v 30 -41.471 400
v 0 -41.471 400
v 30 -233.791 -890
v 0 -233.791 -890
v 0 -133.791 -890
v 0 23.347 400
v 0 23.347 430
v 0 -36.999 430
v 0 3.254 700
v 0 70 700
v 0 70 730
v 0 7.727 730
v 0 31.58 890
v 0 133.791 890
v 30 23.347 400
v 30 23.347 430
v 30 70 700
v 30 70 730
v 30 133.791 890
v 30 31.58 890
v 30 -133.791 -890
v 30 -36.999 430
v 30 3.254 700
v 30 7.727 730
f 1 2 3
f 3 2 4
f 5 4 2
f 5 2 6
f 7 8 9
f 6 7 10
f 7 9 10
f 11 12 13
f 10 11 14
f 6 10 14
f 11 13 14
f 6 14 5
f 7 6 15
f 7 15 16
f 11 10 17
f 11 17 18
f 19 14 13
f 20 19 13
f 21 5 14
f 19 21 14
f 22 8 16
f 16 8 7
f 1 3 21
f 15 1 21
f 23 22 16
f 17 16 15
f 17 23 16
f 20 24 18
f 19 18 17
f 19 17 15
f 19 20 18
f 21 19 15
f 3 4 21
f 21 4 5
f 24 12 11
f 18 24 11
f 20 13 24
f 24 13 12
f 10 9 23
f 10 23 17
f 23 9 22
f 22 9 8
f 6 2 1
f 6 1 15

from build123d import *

# Parameters (mm, degrees)
F1_DEPTH = 30
F2_W     = 70
F2_H     = 30
F3_DEPTH = 30
F4_W     = 95.079931
F4_H     = 30
F5_DEPTH = 30


with BuildPart() as f1:
    # F0 (on Right) → F1 (new body)
    with BuildSketch(Plane.YZ):
        Polygon((133.790882, 890), (31.580462, 890), (-233.790882, -890), (-133.790882, -890), align=None)
    extrude(amount=F1_DEPTH)

    # F2 (on Right) → F3 (cut)
    with BuildSketch(Plane.YZ):
        with Locations((35, 715)):
            Rectangle(F2_W, F2_H)
    extrude(amount=F3_DEPTH, mode=Mode.SUBTRACT)

    # F4 (on Right) → F5 (cut)
    with BuildSketch(Plane.YZ):
        with Locations((-24.192585, 415)):
            Rectangle(F4_W, F4_H)
    extrude(amount=F5_DEPTH, mode=Mode.SUBTRACT)


solid = f1.part
